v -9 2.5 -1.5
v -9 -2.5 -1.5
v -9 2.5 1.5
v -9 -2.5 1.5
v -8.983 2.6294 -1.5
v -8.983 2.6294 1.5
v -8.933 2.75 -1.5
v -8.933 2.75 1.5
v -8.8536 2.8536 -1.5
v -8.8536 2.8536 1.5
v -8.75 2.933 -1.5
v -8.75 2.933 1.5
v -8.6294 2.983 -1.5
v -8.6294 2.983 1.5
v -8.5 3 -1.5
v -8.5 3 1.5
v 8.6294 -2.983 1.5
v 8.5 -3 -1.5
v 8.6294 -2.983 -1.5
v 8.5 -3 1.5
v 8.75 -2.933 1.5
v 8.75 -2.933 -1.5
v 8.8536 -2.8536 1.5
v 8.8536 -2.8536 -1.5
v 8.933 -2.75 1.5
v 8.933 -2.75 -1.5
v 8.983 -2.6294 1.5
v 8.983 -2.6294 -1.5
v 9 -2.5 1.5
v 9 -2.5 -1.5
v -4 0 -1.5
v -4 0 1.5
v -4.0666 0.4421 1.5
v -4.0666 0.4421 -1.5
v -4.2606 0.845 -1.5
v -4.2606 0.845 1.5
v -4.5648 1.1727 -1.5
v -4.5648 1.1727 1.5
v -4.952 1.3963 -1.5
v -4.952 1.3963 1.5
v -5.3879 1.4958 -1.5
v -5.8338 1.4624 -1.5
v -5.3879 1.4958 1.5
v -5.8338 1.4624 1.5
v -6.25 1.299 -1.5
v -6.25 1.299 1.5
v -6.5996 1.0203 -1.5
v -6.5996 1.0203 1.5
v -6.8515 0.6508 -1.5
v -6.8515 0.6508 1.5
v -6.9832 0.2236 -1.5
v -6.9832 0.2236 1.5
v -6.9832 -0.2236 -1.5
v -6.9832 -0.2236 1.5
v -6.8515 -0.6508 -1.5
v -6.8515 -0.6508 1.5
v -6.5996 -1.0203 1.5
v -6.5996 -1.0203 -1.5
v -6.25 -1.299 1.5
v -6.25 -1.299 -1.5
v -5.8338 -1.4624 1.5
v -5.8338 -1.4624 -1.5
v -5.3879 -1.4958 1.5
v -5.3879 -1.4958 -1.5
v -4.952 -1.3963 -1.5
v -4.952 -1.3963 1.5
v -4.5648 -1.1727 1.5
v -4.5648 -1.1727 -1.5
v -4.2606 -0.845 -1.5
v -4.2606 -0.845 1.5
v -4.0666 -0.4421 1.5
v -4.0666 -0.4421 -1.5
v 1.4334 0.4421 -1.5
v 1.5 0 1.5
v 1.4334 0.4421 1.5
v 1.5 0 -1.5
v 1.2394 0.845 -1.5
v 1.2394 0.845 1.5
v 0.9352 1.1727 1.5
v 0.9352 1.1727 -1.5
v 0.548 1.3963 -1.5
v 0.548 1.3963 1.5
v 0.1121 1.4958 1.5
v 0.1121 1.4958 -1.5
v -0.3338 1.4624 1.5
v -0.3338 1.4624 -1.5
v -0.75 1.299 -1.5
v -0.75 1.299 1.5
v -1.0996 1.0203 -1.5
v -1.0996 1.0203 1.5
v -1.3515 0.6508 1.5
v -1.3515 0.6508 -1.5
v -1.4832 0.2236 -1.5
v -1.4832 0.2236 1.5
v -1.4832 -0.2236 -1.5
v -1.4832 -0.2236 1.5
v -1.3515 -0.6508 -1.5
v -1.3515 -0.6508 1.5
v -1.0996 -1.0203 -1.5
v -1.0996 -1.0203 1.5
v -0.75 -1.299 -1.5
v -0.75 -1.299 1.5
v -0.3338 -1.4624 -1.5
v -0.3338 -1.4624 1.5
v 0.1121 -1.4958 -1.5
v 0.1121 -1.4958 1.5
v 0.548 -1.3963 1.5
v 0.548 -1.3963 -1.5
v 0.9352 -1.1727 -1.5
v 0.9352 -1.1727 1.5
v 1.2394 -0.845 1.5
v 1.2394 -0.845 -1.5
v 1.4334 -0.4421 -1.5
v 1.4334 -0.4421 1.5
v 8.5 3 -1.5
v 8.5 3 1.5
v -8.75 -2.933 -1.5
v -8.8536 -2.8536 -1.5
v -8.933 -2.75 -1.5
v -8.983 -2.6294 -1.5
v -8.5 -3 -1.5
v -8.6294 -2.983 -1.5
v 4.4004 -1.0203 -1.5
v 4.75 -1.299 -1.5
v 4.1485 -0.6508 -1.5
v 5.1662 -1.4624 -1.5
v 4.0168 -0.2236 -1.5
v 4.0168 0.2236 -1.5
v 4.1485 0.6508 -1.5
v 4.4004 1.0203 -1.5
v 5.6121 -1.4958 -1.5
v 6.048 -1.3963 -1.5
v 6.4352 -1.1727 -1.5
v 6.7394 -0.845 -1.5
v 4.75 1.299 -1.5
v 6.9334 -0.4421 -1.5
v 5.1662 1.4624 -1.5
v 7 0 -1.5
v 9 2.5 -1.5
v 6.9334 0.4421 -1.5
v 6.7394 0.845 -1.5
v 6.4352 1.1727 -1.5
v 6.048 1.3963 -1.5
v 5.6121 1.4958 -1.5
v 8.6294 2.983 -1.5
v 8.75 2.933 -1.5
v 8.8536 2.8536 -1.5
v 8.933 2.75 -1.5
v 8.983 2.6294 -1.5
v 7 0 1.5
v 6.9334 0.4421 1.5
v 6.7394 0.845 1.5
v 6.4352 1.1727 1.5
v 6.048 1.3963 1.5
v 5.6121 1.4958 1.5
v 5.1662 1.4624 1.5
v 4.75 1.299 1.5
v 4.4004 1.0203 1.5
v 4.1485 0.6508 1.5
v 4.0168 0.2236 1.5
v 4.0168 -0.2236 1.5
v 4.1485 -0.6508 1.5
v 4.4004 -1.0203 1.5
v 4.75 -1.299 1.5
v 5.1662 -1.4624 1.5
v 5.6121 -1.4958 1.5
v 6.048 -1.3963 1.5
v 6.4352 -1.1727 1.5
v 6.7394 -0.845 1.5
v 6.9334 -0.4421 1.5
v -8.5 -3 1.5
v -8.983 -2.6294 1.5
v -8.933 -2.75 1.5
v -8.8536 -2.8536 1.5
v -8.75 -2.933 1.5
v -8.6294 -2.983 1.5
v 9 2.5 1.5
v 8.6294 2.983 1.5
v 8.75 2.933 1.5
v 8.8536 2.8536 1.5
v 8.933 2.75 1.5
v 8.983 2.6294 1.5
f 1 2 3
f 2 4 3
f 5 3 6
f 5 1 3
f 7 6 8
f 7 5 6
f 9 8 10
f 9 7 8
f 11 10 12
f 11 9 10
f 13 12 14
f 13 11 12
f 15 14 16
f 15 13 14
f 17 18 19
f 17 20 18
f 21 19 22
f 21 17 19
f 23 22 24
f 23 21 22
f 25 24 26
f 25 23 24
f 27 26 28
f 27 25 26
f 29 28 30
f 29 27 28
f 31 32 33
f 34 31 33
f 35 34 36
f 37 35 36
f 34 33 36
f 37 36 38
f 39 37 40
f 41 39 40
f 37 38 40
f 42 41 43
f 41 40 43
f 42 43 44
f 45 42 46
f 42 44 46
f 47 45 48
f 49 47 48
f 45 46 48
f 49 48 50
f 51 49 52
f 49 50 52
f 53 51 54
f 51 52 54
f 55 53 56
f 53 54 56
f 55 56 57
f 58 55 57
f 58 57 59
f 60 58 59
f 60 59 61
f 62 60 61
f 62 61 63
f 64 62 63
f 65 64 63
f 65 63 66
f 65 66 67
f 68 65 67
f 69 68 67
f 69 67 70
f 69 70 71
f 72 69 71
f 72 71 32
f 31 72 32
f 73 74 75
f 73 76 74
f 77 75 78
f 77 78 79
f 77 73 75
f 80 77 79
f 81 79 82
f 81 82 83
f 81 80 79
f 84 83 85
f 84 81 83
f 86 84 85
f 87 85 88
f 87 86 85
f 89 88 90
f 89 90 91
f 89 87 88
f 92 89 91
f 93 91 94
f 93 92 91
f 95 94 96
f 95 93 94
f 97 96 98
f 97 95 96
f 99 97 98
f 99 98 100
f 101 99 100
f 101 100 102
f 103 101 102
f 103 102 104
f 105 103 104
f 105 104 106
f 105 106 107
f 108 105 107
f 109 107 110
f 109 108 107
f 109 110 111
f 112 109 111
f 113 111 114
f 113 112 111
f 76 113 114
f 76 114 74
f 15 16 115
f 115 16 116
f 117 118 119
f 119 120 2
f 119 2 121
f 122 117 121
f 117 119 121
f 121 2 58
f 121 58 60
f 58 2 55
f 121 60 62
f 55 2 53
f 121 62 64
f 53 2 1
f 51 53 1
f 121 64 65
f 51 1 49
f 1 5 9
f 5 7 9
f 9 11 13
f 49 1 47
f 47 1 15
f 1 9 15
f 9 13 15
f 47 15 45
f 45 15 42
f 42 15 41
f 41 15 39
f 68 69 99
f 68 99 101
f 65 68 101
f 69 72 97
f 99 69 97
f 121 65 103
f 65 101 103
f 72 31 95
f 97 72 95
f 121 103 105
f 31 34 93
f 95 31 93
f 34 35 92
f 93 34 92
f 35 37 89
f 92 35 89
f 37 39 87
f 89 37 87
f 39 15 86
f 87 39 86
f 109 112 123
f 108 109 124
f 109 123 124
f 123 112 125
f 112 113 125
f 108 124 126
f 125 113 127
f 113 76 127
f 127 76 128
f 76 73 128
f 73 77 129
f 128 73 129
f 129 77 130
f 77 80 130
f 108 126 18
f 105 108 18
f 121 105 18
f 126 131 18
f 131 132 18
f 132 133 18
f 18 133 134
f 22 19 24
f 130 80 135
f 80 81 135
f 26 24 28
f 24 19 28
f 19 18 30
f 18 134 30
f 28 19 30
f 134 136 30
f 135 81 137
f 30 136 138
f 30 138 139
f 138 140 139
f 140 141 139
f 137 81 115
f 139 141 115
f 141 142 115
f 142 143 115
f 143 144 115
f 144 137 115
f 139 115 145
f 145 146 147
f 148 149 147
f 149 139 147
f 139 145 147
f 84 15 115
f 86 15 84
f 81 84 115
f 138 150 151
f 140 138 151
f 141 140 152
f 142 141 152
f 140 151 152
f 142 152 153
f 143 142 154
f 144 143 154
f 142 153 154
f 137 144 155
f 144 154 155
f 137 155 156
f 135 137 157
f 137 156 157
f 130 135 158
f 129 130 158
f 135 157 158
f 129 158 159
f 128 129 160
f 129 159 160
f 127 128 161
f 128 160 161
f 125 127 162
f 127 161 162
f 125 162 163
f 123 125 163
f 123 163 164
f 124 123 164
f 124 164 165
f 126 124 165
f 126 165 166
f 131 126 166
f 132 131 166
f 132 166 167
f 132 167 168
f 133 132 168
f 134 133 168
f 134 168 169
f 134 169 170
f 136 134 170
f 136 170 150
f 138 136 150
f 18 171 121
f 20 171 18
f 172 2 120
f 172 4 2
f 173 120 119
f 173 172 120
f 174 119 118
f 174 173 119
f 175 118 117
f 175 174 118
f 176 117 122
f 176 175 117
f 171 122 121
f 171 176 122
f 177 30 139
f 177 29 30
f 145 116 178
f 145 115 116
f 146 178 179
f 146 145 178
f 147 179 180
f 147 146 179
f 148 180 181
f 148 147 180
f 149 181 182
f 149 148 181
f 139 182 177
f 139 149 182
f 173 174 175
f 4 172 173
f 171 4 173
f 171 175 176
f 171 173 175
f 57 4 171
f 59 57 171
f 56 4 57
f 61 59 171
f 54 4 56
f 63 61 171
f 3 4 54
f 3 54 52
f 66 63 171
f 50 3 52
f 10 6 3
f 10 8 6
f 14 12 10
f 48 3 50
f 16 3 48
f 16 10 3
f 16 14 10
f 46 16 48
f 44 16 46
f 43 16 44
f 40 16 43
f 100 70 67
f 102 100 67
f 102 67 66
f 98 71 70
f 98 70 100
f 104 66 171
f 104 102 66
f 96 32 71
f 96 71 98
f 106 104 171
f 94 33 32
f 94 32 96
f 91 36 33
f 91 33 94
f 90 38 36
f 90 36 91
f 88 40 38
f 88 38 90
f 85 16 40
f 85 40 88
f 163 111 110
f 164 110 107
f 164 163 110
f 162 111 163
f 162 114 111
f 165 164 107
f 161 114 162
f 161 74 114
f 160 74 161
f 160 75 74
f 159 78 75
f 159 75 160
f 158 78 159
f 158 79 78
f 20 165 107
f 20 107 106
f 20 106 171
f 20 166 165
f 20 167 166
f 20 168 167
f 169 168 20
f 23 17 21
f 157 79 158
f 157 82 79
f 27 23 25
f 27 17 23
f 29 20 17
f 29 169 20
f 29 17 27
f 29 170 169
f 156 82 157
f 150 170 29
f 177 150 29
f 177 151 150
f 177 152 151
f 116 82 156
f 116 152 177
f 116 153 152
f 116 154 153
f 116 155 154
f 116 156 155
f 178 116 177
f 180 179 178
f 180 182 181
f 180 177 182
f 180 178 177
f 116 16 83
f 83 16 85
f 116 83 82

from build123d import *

# Parameters (mm, degrees)
SKETCH_1_W          = 18
SKETCH_1_H          = 6
SKETCH_1_R          = 1.5
EXTRUDE_1_DEPTH     = 1.5
SKETCH_2_R          = 1.5
CUT_EXTRUDE_1_DEPTH = 10.949874371
FILLET_1_R          = 0.5


with BuildPart() as part:
    # 草图1 → 凸台-拉伸1 (new, symmetric)
    with BuildSketch(Plane.XY):
        Rectangle(SKETCH_1_W, SKETCH_1_H)
        Circle(SKETCH_1_R, mode=Mode.SUBTRACT)
    extrude(amount=EXTRUDE_1_DEPTH, both=True)

    # 草图2 → 切除-拉伸1 (cut, through all)
    with BuildSketch(Plane.XY.offset(1.5)):
        with Locations((-5.5, 0)):
            Circle(SKETCH_2_R)
        with Locations((5.5, 0)):
            Circle(SKETCH_2_R)
    extrude(amount=-CUT_EXTRUDE_1_DEPTH, mode=Mode.SUBTRACT)

    # 圆角1
    fillet_1_edges = [part.edges().sort_by_distance(p)[0] for p in [
        (-9, 3, 0),
        (9, 3, 0),
        (9, -3, 0),
        (-9, -3, 0),
    ]]
    fillet(fillet_1_edges, radius=FILLET_1_R)


solid = part.part
